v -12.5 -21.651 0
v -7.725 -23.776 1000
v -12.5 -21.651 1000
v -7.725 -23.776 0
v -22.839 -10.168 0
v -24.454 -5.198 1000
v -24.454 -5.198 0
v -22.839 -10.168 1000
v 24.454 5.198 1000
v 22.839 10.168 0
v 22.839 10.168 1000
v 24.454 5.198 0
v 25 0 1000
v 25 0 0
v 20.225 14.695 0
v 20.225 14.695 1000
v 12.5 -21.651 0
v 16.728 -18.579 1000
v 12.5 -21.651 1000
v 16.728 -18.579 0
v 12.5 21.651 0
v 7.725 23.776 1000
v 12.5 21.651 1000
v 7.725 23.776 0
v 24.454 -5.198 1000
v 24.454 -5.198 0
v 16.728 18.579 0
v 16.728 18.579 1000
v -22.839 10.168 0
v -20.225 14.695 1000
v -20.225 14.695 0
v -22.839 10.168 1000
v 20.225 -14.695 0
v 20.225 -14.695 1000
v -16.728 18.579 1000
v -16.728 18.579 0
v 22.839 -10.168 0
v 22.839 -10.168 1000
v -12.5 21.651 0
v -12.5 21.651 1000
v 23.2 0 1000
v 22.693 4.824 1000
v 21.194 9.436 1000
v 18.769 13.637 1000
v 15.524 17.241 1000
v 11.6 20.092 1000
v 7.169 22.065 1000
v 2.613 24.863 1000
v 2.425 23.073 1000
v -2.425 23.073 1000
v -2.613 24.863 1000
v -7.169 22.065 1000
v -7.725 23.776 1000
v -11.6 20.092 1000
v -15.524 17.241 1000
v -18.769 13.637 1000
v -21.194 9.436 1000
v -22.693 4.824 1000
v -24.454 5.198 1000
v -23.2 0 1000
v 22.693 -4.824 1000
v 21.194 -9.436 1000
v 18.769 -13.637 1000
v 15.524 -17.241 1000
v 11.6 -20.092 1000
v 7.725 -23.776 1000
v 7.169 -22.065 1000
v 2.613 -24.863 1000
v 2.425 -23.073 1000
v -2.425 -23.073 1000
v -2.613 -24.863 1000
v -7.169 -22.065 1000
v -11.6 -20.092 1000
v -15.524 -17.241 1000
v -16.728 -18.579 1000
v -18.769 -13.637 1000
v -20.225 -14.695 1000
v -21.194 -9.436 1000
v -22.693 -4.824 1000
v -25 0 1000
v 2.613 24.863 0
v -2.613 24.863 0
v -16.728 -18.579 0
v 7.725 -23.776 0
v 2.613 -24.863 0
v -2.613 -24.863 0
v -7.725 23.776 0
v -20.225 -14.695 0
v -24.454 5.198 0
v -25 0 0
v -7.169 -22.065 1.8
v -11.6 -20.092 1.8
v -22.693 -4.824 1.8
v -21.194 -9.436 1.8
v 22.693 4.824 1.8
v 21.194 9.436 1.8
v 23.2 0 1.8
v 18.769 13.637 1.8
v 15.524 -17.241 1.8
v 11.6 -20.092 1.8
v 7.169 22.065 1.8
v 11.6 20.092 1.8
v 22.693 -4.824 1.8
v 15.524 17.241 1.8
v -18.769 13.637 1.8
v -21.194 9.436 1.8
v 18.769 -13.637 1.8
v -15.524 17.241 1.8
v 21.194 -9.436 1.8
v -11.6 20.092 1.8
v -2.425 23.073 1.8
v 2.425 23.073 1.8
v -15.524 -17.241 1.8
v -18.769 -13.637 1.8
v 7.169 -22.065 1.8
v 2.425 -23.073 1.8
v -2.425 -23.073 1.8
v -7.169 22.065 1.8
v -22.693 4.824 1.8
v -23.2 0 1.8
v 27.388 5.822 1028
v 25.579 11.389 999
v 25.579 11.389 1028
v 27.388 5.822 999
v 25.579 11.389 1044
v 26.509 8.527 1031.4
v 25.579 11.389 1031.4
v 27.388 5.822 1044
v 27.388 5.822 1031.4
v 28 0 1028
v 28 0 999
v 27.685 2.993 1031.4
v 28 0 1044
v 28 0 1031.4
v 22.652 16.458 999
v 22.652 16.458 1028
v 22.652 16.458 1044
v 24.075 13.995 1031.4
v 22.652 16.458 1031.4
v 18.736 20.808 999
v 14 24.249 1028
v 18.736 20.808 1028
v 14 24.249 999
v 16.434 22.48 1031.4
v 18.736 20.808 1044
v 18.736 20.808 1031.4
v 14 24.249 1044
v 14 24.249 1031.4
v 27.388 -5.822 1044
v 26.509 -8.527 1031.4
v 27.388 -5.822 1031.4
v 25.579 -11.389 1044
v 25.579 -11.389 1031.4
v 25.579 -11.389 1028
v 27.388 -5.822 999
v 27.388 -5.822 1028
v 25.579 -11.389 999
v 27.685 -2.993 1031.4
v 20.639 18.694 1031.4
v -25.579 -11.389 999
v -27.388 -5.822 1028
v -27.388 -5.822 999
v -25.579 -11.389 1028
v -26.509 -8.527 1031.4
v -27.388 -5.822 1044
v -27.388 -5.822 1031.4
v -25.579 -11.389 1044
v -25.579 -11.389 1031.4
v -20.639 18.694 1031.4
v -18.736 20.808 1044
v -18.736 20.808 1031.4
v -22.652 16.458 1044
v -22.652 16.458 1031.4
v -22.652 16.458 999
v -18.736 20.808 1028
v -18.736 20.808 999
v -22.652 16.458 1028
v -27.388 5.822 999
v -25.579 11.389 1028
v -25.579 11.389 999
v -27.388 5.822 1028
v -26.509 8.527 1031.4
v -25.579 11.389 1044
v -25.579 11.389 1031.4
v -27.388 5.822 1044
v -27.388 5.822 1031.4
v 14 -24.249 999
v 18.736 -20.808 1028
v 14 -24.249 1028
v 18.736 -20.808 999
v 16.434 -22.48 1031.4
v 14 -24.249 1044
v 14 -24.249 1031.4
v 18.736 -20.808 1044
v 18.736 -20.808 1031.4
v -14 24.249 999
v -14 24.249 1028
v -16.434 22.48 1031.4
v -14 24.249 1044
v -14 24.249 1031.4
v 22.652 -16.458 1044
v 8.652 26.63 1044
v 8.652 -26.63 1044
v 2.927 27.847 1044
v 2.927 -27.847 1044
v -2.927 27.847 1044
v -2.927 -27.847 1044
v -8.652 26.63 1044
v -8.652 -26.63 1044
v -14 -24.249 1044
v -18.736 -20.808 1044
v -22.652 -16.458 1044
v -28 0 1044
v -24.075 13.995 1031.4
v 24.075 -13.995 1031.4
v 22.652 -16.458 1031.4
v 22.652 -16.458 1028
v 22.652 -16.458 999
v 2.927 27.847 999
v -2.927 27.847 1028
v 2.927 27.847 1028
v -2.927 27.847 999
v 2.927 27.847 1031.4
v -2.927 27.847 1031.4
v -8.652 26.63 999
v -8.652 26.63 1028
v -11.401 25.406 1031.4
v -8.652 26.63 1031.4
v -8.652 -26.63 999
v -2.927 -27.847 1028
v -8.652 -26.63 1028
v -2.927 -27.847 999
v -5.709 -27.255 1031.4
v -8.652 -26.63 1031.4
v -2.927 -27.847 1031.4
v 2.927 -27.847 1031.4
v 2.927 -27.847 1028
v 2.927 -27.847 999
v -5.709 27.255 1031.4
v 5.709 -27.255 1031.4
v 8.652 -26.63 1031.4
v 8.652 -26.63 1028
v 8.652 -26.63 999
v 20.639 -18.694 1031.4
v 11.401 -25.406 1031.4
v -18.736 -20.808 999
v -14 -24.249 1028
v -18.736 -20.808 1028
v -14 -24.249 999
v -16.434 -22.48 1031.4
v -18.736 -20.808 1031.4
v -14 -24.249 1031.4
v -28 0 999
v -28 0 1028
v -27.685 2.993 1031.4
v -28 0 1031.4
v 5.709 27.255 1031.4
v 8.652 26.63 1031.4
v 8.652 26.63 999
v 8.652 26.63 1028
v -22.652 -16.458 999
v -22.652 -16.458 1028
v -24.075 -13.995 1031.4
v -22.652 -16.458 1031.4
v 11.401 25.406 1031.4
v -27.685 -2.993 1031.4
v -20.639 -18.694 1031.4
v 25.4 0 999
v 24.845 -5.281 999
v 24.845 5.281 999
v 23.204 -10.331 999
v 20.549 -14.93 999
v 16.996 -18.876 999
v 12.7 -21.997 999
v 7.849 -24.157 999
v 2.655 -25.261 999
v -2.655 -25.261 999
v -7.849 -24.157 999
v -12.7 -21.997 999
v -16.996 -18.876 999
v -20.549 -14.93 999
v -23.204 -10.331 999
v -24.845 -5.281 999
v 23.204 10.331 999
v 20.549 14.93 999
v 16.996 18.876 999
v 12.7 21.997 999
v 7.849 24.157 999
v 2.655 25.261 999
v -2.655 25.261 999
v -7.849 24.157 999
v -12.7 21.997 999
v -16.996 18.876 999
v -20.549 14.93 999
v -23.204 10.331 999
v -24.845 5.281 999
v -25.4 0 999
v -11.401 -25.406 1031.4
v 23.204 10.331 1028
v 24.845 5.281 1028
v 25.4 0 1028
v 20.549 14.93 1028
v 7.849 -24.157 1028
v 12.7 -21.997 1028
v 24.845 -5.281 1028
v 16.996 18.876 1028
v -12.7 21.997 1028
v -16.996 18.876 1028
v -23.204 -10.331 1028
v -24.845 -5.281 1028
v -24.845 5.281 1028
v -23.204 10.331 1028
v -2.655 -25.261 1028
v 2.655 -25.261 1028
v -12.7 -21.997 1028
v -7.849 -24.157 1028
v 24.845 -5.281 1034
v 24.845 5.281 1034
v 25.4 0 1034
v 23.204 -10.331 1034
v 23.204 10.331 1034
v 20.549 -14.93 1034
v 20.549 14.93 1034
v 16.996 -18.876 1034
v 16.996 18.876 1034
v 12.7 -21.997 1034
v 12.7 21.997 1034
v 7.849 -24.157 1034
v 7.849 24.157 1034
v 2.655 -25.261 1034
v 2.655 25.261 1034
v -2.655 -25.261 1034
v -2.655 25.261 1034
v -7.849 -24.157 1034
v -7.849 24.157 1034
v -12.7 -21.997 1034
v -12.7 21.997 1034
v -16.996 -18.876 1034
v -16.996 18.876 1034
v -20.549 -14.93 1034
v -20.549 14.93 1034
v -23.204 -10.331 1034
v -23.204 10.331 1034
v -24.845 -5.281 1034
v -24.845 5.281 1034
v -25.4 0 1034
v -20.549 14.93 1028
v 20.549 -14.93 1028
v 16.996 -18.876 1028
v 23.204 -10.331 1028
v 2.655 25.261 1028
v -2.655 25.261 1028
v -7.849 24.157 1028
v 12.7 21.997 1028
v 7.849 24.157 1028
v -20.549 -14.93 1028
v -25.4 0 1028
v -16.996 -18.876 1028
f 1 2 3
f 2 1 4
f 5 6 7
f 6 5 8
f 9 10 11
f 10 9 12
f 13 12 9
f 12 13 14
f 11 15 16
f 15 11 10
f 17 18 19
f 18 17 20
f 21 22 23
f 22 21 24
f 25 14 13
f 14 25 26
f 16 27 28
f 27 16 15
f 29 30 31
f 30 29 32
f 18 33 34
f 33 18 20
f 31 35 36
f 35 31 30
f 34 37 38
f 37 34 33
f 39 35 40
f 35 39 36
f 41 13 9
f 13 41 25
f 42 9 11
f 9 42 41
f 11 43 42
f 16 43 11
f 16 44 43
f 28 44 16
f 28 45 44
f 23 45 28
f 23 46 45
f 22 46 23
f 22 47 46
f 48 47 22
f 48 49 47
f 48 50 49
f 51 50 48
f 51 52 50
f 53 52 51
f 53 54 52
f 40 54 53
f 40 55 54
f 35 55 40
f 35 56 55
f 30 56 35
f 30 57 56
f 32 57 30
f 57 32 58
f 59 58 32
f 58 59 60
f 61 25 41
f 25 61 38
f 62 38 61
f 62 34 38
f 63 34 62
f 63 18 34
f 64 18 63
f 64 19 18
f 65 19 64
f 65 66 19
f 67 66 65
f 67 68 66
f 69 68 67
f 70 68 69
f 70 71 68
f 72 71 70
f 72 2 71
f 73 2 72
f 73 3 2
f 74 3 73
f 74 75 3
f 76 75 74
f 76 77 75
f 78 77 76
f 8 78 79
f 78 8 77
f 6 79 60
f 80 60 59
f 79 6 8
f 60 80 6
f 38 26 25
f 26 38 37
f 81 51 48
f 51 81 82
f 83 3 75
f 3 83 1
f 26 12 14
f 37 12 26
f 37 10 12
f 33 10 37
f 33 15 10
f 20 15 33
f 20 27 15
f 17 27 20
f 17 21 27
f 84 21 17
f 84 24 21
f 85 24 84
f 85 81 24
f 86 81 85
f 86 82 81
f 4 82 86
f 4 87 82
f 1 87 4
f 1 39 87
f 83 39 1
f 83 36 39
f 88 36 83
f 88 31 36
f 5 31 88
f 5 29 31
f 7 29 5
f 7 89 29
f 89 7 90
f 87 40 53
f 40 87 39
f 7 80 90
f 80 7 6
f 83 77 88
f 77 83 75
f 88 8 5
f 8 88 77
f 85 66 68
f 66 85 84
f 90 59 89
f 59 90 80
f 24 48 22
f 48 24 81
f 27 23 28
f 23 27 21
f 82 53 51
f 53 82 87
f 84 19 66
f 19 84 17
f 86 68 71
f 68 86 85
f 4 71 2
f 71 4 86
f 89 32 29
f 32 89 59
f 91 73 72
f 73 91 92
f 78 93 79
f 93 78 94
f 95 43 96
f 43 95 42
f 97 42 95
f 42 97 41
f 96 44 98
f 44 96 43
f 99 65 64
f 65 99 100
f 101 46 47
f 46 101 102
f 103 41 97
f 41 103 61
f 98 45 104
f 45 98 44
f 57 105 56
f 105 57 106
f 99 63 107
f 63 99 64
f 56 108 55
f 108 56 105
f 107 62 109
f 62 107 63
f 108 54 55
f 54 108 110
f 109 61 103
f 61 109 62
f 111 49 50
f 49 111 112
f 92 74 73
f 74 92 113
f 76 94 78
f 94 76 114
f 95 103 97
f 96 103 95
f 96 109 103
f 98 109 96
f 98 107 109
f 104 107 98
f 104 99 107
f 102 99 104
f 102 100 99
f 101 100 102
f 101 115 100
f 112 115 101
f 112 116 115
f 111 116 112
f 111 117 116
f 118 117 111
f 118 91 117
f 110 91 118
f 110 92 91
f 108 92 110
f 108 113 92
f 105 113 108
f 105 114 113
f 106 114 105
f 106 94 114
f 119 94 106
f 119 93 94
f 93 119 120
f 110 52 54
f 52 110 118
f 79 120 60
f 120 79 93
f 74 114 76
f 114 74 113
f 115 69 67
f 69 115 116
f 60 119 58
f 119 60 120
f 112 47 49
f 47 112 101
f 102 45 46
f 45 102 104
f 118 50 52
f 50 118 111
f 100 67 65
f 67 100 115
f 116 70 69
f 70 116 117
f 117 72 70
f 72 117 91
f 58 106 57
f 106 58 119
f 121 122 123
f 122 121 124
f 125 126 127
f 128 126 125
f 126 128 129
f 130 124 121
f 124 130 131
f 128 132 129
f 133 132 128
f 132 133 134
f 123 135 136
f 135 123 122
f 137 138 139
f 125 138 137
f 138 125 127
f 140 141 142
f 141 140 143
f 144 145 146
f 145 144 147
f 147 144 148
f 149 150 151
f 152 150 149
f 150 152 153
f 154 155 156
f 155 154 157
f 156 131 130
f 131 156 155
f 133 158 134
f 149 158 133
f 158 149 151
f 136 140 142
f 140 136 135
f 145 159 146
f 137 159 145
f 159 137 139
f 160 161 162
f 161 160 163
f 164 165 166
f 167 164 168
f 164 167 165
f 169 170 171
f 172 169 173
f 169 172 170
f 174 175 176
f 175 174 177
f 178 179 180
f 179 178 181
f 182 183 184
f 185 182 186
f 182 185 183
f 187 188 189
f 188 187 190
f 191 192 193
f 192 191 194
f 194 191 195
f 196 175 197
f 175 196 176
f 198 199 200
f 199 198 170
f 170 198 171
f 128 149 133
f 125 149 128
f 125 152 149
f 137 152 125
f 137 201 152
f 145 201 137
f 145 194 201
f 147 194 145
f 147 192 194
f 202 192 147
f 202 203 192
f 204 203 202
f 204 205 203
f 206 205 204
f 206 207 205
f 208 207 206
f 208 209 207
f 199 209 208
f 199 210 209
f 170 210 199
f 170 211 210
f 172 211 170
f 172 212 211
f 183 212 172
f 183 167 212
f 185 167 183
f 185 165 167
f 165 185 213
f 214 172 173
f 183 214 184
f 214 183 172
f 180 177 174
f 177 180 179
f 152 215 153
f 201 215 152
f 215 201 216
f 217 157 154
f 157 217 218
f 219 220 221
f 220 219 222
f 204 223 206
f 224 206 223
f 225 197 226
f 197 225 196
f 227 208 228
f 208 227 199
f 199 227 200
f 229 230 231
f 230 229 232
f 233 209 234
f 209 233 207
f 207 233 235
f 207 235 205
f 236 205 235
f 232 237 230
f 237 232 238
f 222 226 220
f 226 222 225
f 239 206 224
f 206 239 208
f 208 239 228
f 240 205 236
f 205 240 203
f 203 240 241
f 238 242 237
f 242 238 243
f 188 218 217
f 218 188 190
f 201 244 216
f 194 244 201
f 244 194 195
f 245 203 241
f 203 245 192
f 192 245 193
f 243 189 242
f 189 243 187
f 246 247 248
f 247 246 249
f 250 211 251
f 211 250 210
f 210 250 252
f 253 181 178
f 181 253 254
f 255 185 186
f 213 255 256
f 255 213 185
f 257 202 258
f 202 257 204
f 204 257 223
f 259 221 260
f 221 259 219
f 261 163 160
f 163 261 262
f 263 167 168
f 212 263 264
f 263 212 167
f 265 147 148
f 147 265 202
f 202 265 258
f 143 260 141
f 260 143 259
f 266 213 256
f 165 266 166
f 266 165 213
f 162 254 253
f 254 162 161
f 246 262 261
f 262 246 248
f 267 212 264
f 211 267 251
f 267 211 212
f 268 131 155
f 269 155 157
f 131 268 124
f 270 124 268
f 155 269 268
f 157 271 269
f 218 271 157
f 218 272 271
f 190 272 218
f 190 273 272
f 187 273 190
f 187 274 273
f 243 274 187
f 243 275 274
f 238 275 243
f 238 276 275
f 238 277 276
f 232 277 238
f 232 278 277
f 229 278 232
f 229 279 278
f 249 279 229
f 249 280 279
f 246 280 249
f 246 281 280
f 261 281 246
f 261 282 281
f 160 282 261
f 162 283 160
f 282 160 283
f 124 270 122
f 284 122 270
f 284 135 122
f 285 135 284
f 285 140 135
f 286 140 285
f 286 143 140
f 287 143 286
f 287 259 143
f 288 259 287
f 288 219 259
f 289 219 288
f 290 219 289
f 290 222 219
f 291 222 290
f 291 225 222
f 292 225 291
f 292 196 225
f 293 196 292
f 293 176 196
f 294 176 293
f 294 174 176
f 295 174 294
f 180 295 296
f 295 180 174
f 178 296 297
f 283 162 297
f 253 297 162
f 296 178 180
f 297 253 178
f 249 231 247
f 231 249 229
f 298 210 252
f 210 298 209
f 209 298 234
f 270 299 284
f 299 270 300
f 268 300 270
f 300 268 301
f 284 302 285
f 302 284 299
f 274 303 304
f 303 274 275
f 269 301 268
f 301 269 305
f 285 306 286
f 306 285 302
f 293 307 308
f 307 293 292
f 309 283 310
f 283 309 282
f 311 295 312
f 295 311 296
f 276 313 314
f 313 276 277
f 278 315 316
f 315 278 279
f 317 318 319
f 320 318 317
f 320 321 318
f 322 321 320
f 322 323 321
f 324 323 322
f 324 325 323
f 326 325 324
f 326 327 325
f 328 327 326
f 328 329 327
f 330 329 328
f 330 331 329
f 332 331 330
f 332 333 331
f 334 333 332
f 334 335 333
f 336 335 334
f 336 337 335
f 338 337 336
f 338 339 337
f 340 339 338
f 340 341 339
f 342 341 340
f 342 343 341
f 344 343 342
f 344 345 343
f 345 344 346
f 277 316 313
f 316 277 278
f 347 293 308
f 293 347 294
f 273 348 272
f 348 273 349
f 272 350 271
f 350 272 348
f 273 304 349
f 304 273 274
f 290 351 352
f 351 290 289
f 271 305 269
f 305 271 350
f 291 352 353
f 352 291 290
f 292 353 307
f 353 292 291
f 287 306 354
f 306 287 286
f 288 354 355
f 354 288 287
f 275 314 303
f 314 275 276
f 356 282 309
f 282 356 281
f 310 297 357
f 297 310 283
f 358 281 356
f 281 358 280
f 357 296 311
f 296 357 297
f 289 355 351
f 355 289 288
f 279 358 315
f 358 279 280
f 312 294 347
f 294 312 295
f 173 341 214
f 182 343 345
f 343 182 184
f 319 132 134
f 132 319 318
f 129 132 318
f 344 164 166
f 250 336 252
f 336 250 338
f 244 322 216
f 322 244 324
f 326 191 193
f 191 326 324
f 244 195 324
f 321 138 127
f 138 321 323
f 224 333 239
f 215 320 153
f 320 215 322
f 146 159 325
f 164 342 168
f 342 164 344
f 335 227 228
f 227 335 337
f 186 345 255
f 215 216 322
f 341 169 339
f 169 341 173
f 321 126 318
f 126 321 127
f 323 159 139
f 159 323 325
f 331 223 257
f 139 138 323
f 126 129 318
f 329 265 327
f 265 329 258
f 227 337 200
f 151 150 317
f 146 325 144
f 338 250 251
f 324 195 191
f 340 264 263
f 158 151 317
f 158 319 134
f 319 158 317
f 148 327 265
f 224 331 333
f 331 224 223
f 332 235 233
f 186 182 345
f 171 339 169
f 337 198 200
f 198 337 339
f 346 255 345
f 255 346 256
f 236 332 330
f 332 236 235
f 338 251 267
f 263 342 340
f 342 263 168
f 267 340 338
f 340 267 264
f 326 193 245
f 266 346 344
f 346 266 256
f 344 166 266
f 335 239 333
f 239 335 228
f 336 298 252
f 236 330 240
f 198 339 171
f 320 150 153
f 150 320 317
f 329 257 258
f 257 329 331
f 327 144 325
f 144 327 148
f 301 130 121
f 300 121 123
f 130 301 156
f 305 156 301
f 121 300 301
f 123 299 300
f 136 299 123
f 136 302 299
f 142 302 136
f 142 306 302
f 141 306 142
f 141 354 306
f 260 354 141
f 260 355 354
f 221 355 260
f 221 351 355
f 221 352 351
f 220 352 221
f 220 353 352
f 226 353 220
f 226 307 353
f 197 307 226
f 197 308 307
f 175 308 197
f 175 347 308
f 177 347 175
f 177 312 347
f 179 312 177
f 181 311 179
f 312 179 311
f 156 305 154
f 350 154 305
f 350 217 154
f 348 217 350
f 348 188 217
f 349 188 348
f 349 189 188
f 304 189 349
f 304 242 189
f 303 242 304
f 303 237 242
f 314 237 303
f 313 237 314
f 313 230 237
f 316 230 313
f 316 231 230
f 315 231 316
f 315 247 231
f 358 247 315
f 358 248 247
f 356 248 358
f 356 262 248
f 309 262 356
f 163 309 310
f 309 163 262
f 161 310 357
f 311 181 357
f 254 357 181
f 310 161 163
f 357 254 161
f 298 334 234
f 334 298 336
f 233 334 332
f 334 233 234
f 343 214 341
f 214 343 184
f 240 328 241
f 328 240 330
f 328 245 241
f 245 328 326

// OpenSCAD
// Parameters
pipe_standard = 1; //[1:1]
nominal_diameter = 50; //[25:100:1]
length_mm = 1000; //[500:2000:10]
include_end_fitting = 1; //[0:1:1]
od_mm = 50; //[25:100:1]
wall_thickness_mm = 1.8; //[0.9:3.6:0.1]
overlap_mm = 1; //[0.5:2:0.1]
fitting_length_mm = 45; //[25:90:1]
fitting_od_mm = 56; //[50:80:1]
socket_wall_extra_mm = 2.2; //[1:5:0.1]
socket_depth_mm = 35; //[15:70:1]
socket_clearance_mm = 0.4; //[0.1:1:0.1]
chamfer_length_mm = 6; //[2:15:1]

// HT Pipe - complete geometry
module ht_pipe() {
  color([0.85, 0.85, 0.8]) {
    // Pipe body
    difference() {
      cylinder(h=length_mm, r=od_mm/2, center=false);
      translate([0, 0, wall_thickness_mm])
        cylinder(h=length_mm, r=od_mm/2 - wall_thickness_mm, center=false);
    }
    
    // End fitting
    if (include_end_fitting) {
      translate([0, 0, length_mm - overlap_mm]) {
        difference() {
          cylinder(h=fitting_length_mm, r=fitting_od_mm/2, center=false);
          translate([0, 0, -overlap_mm])
            cylinder(h=socket_depth_mm + overlap_mm, r=od_mm/2 + socket_clearance_mm, center=false);
          translate([0, 0, socket_depth_mm - chamfer_length_mm])
            cylinder(h=chamfer_length_mm, r1=od_mm/2 + socket_clearance_mm + chamfer_length_mm, r2=od_mm/2 + socket_clearance_mm, center=false);
        }
      }
    }
  }
}

// Assembly
module assembly() {
  ht_pipe();
}

assembly();
